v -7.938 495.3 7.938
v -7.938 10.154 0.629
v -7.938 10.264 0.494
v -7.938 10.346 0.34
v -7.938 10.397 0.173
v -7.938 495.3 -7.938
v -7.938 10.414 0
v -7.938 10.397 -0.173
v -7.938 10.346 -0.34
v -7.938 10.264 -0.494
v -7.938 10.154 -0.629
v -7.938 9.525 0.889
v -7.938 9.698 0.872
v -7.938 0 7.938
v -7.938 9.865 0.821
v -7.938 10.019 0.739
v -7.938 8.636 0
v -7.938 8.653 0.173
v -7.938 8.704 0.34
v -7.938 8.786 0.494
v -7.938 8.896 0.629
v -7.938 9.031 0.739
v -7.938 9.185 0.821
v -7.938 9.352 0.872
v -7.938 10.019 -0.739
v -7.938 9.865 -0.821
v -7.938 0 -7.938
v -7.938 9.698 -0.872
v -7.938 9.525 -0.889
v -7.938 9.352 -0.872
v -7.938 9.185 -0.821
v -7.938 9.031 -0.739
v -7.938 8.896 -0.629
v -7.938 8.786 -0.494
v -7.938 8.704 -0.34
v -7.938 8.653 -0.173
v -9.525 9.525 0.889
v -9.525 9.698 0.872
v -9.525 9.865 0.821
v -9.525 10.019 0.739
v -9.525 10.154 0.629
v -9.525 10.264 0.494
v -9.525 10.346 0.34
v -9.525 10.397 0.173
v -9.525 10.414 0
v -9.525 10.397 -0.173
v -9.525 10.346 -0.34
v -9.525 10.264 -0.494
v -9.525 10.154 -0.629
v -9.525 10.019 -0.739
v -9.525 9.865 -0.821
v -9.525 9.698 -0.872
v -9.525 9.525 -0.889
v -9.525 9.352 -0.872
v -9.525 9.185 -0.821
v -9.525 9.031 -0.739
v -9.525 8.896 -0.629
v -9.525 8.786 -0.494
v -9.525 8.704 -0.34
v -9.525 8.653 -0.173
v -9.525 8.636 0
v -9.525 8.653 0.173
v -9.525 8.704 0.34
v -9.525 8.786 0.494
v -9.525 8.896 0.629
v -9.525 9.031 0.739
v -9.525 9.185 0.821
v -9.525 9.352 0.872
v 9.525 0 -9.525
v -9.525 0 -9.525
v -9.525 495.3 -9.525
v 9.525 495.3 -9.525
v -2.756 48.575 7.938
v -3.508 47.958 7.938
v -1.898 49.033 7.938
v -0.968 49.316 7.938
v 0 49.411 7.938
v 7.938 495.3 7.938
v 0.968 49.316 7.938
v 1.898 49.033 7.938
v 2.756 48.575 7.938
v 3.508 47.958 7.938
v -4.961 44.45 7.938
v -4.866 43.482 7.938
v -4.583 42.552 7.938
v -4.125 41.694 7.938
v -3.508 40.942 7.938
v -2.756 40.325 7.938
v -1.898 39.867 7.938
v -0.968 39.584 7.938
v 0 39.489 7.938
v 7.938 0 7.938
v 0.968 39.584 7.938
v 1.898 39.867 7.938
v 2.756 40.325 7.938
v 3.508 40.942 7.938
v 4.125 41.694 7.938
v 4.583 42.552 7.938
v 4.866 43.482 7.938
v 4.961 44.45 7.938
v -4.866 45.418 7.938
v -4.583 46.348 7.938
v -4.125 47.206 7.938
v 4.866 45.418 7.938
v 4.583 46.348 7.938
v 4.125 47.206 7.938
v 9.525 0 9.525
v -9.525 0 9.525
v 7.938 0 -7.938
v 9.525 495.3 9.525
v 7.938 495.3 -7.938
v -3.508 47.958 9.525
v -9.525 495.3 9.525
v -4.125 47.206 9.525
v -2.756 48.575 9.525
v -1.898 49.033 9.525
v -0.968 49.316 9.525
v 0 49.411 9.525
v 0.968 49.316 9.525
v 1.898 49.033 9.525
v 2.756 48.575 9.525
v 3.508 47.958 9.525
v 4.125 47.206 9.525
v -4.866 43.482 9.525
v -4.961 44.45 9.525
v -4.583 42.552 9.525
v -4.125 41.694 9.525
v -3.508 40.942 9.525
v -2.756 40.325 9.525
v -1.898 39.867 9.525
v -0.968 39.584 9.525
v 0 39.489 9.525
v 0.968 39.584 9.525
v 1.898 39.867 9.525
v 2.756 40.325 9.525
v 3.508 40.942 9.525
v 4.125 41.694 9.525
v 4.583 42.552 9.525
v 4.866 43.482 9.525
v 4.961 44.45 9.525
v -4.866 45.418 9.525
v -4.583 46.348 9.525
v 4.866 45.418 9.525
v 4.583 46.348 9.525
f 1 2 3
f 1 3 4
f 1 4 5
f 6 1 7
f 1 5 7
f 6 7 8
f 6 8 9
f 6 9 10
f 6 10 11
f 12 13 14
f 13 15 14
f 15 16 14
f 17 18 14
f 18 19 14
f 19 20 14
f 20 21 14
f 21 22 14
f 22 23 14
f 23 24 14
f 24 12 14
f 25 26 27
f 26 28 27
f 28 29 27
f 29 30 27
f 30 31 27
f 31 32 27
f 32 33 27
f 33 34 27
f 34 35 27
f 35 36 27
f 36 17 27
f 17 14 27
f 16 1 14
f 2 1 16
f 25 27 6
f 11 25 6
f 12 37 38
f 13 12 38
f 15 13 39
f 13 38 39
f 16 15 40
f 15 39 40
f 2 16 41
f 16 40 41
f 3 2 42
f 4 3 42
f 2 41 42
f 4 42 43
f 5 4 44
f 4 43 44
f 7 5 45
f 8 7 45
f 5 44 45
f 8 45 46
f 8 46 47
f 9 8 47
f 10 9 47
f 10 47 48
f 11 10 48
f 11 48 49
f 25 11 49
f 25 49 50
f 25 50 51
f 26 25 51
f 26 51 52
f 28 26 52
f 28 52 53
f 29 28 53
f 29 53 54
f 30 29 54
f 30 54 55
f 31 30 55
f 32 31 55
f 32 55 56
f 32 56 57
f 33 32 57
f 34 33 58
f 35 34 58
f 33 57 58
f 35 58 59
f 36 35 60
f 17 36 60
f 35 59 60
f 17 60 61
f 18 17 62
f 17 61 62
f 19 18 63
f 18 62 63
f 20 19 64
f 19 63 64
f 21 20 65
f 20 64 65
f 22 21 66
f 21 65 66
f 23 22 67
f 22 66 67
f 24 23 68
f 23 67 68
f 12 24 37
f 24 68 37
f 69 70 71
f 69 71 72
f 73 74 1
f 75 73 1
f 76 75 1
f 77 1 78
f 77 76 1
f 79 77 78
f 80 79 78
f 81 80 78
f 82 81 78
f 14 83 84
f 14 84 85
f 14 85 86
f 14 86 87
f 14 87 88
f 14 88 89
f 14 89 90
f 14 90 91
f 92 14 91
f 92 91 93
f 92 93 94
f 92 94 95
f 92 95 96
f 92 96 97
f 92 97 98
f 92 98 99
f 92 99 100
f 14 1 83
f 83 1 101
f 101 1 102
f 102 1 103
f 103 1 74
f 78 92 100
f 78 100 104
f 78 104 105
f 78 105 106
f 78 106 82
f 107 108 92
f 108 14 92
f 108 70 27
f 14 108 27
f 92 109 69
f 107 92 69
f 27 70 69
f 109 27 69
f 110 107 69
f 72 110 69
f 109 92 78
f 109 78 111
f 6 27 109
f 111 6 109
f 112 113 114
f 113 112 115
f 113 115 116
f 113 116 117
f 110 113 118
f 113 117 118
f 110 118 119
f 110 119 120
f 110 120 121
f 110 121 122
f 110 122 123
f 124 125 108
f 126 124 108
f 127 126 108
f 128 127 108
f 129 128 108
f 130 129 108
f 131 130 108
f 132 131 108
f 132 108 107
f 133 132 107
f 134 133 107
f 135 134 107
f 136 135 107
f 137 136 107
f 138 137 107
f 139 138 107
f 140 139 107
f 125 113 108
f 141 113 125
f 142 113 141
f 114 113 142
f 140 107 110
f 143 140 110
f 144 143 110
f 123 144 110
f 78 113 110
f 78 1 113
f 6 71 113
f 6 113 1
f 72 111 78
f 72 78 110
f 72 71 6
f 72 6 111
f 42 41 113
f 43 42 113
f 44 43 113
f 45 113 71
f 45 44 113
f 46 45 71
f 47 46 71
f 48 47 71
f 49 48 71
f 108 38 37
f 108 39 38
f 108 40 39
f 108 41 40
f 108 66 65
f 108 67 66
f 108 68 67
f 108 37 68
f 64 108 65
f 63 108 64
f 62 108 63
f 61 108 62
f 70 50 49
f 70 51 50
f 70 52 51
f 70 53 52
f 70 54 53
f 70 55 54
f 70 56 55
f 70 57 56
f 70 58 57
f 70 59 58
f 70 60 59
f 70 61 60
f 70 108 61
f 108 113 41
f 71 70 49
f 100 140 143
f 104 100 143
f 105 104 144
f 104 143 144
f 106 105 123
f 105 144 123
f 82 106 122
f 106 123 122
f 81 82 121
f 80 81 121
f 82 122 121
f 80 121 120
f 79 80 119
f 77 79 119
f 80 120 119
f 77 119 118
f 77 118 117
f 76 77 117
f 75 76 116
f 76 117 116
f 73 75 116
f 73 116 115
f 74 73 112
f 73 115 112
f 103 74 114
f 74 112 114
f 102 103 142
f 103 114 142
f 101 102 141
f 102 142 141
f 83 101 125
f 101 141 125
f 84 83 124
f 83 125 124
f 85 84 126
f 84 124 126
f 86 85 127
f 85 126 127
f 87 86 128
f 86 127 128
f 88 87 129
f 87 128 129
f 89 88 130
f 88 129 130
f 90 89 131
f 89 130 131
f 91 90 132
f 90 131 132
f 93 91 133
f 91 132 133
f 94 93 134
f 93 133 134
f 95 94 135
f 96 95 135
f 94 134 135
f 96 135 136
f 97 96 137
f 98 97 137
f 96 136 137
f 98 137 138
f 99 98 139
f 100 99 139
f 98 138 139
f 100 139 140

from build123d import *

# Parameters (mm, degrees)
SKETCH1_W           = 19.05
SKETCH1_H           = 19.05
SKETCH1_W_2         = 15.875
SKETCH1_H_2         = 15.875
BOSS_EXTRUDE1_DEPTH = 495.3
SKETCH2_R           = 4.9609375
CUT_EXTRUDE1_DEPTH  = 1.5875
CUT_EXTRUDE2_REACH  = 21.05
SKETCH3_R           = 0.889


with BuildPart() as part:
    # Sketch1 → Boss-Extrude1 (new body)
    with BuildSketch(Plane(origin=(0, 0, 0), x_dir=(1, 0, 0), z_dir=(0, 1, 0))):
        Rectangle(SKETCH1_W, SKETCH1_H)
        Rectangle(SKETCH1_W_2, SKETCH1_H_2, mode=Mode.SUBTRACT)
    extrude(amount=BOSS_EXTRUDE1_DEPTH)

    # Sketch2 → Cut-Extrude1 (cut)
    with BuildSketch(Plane.XY.offset(9.525)):
        with Locations((0, 44.45)):
            Circle(SKETCH2_R)
    extrude(amount=-CUT_EXTRUDE1_DEPTH, mode=Mode.SUBTRACT)

    # Sketch3 → Cut-Extrude2 (cut, up to next)
    with BuildSketch(Plane.ZY.offset(9.525), mode=Mode.PRIVATE) as cut_extrude2_sk1:
        with Locations((0, 9.525)):
            Circle(SKETCH3_R)
    cut_extrude2_tool1 = extrude(cut_extrude2_sk1.sketch, amount=-CUT_EXTRUDE2_REACH, mode=Mode.PRIVATE) & part.part
    add(cut_extrude2_tool1.solids().sort_by_distance((-9.525, 9.525, 0))[0], mode=Mode.SUBTRACT)


solid = part.part
